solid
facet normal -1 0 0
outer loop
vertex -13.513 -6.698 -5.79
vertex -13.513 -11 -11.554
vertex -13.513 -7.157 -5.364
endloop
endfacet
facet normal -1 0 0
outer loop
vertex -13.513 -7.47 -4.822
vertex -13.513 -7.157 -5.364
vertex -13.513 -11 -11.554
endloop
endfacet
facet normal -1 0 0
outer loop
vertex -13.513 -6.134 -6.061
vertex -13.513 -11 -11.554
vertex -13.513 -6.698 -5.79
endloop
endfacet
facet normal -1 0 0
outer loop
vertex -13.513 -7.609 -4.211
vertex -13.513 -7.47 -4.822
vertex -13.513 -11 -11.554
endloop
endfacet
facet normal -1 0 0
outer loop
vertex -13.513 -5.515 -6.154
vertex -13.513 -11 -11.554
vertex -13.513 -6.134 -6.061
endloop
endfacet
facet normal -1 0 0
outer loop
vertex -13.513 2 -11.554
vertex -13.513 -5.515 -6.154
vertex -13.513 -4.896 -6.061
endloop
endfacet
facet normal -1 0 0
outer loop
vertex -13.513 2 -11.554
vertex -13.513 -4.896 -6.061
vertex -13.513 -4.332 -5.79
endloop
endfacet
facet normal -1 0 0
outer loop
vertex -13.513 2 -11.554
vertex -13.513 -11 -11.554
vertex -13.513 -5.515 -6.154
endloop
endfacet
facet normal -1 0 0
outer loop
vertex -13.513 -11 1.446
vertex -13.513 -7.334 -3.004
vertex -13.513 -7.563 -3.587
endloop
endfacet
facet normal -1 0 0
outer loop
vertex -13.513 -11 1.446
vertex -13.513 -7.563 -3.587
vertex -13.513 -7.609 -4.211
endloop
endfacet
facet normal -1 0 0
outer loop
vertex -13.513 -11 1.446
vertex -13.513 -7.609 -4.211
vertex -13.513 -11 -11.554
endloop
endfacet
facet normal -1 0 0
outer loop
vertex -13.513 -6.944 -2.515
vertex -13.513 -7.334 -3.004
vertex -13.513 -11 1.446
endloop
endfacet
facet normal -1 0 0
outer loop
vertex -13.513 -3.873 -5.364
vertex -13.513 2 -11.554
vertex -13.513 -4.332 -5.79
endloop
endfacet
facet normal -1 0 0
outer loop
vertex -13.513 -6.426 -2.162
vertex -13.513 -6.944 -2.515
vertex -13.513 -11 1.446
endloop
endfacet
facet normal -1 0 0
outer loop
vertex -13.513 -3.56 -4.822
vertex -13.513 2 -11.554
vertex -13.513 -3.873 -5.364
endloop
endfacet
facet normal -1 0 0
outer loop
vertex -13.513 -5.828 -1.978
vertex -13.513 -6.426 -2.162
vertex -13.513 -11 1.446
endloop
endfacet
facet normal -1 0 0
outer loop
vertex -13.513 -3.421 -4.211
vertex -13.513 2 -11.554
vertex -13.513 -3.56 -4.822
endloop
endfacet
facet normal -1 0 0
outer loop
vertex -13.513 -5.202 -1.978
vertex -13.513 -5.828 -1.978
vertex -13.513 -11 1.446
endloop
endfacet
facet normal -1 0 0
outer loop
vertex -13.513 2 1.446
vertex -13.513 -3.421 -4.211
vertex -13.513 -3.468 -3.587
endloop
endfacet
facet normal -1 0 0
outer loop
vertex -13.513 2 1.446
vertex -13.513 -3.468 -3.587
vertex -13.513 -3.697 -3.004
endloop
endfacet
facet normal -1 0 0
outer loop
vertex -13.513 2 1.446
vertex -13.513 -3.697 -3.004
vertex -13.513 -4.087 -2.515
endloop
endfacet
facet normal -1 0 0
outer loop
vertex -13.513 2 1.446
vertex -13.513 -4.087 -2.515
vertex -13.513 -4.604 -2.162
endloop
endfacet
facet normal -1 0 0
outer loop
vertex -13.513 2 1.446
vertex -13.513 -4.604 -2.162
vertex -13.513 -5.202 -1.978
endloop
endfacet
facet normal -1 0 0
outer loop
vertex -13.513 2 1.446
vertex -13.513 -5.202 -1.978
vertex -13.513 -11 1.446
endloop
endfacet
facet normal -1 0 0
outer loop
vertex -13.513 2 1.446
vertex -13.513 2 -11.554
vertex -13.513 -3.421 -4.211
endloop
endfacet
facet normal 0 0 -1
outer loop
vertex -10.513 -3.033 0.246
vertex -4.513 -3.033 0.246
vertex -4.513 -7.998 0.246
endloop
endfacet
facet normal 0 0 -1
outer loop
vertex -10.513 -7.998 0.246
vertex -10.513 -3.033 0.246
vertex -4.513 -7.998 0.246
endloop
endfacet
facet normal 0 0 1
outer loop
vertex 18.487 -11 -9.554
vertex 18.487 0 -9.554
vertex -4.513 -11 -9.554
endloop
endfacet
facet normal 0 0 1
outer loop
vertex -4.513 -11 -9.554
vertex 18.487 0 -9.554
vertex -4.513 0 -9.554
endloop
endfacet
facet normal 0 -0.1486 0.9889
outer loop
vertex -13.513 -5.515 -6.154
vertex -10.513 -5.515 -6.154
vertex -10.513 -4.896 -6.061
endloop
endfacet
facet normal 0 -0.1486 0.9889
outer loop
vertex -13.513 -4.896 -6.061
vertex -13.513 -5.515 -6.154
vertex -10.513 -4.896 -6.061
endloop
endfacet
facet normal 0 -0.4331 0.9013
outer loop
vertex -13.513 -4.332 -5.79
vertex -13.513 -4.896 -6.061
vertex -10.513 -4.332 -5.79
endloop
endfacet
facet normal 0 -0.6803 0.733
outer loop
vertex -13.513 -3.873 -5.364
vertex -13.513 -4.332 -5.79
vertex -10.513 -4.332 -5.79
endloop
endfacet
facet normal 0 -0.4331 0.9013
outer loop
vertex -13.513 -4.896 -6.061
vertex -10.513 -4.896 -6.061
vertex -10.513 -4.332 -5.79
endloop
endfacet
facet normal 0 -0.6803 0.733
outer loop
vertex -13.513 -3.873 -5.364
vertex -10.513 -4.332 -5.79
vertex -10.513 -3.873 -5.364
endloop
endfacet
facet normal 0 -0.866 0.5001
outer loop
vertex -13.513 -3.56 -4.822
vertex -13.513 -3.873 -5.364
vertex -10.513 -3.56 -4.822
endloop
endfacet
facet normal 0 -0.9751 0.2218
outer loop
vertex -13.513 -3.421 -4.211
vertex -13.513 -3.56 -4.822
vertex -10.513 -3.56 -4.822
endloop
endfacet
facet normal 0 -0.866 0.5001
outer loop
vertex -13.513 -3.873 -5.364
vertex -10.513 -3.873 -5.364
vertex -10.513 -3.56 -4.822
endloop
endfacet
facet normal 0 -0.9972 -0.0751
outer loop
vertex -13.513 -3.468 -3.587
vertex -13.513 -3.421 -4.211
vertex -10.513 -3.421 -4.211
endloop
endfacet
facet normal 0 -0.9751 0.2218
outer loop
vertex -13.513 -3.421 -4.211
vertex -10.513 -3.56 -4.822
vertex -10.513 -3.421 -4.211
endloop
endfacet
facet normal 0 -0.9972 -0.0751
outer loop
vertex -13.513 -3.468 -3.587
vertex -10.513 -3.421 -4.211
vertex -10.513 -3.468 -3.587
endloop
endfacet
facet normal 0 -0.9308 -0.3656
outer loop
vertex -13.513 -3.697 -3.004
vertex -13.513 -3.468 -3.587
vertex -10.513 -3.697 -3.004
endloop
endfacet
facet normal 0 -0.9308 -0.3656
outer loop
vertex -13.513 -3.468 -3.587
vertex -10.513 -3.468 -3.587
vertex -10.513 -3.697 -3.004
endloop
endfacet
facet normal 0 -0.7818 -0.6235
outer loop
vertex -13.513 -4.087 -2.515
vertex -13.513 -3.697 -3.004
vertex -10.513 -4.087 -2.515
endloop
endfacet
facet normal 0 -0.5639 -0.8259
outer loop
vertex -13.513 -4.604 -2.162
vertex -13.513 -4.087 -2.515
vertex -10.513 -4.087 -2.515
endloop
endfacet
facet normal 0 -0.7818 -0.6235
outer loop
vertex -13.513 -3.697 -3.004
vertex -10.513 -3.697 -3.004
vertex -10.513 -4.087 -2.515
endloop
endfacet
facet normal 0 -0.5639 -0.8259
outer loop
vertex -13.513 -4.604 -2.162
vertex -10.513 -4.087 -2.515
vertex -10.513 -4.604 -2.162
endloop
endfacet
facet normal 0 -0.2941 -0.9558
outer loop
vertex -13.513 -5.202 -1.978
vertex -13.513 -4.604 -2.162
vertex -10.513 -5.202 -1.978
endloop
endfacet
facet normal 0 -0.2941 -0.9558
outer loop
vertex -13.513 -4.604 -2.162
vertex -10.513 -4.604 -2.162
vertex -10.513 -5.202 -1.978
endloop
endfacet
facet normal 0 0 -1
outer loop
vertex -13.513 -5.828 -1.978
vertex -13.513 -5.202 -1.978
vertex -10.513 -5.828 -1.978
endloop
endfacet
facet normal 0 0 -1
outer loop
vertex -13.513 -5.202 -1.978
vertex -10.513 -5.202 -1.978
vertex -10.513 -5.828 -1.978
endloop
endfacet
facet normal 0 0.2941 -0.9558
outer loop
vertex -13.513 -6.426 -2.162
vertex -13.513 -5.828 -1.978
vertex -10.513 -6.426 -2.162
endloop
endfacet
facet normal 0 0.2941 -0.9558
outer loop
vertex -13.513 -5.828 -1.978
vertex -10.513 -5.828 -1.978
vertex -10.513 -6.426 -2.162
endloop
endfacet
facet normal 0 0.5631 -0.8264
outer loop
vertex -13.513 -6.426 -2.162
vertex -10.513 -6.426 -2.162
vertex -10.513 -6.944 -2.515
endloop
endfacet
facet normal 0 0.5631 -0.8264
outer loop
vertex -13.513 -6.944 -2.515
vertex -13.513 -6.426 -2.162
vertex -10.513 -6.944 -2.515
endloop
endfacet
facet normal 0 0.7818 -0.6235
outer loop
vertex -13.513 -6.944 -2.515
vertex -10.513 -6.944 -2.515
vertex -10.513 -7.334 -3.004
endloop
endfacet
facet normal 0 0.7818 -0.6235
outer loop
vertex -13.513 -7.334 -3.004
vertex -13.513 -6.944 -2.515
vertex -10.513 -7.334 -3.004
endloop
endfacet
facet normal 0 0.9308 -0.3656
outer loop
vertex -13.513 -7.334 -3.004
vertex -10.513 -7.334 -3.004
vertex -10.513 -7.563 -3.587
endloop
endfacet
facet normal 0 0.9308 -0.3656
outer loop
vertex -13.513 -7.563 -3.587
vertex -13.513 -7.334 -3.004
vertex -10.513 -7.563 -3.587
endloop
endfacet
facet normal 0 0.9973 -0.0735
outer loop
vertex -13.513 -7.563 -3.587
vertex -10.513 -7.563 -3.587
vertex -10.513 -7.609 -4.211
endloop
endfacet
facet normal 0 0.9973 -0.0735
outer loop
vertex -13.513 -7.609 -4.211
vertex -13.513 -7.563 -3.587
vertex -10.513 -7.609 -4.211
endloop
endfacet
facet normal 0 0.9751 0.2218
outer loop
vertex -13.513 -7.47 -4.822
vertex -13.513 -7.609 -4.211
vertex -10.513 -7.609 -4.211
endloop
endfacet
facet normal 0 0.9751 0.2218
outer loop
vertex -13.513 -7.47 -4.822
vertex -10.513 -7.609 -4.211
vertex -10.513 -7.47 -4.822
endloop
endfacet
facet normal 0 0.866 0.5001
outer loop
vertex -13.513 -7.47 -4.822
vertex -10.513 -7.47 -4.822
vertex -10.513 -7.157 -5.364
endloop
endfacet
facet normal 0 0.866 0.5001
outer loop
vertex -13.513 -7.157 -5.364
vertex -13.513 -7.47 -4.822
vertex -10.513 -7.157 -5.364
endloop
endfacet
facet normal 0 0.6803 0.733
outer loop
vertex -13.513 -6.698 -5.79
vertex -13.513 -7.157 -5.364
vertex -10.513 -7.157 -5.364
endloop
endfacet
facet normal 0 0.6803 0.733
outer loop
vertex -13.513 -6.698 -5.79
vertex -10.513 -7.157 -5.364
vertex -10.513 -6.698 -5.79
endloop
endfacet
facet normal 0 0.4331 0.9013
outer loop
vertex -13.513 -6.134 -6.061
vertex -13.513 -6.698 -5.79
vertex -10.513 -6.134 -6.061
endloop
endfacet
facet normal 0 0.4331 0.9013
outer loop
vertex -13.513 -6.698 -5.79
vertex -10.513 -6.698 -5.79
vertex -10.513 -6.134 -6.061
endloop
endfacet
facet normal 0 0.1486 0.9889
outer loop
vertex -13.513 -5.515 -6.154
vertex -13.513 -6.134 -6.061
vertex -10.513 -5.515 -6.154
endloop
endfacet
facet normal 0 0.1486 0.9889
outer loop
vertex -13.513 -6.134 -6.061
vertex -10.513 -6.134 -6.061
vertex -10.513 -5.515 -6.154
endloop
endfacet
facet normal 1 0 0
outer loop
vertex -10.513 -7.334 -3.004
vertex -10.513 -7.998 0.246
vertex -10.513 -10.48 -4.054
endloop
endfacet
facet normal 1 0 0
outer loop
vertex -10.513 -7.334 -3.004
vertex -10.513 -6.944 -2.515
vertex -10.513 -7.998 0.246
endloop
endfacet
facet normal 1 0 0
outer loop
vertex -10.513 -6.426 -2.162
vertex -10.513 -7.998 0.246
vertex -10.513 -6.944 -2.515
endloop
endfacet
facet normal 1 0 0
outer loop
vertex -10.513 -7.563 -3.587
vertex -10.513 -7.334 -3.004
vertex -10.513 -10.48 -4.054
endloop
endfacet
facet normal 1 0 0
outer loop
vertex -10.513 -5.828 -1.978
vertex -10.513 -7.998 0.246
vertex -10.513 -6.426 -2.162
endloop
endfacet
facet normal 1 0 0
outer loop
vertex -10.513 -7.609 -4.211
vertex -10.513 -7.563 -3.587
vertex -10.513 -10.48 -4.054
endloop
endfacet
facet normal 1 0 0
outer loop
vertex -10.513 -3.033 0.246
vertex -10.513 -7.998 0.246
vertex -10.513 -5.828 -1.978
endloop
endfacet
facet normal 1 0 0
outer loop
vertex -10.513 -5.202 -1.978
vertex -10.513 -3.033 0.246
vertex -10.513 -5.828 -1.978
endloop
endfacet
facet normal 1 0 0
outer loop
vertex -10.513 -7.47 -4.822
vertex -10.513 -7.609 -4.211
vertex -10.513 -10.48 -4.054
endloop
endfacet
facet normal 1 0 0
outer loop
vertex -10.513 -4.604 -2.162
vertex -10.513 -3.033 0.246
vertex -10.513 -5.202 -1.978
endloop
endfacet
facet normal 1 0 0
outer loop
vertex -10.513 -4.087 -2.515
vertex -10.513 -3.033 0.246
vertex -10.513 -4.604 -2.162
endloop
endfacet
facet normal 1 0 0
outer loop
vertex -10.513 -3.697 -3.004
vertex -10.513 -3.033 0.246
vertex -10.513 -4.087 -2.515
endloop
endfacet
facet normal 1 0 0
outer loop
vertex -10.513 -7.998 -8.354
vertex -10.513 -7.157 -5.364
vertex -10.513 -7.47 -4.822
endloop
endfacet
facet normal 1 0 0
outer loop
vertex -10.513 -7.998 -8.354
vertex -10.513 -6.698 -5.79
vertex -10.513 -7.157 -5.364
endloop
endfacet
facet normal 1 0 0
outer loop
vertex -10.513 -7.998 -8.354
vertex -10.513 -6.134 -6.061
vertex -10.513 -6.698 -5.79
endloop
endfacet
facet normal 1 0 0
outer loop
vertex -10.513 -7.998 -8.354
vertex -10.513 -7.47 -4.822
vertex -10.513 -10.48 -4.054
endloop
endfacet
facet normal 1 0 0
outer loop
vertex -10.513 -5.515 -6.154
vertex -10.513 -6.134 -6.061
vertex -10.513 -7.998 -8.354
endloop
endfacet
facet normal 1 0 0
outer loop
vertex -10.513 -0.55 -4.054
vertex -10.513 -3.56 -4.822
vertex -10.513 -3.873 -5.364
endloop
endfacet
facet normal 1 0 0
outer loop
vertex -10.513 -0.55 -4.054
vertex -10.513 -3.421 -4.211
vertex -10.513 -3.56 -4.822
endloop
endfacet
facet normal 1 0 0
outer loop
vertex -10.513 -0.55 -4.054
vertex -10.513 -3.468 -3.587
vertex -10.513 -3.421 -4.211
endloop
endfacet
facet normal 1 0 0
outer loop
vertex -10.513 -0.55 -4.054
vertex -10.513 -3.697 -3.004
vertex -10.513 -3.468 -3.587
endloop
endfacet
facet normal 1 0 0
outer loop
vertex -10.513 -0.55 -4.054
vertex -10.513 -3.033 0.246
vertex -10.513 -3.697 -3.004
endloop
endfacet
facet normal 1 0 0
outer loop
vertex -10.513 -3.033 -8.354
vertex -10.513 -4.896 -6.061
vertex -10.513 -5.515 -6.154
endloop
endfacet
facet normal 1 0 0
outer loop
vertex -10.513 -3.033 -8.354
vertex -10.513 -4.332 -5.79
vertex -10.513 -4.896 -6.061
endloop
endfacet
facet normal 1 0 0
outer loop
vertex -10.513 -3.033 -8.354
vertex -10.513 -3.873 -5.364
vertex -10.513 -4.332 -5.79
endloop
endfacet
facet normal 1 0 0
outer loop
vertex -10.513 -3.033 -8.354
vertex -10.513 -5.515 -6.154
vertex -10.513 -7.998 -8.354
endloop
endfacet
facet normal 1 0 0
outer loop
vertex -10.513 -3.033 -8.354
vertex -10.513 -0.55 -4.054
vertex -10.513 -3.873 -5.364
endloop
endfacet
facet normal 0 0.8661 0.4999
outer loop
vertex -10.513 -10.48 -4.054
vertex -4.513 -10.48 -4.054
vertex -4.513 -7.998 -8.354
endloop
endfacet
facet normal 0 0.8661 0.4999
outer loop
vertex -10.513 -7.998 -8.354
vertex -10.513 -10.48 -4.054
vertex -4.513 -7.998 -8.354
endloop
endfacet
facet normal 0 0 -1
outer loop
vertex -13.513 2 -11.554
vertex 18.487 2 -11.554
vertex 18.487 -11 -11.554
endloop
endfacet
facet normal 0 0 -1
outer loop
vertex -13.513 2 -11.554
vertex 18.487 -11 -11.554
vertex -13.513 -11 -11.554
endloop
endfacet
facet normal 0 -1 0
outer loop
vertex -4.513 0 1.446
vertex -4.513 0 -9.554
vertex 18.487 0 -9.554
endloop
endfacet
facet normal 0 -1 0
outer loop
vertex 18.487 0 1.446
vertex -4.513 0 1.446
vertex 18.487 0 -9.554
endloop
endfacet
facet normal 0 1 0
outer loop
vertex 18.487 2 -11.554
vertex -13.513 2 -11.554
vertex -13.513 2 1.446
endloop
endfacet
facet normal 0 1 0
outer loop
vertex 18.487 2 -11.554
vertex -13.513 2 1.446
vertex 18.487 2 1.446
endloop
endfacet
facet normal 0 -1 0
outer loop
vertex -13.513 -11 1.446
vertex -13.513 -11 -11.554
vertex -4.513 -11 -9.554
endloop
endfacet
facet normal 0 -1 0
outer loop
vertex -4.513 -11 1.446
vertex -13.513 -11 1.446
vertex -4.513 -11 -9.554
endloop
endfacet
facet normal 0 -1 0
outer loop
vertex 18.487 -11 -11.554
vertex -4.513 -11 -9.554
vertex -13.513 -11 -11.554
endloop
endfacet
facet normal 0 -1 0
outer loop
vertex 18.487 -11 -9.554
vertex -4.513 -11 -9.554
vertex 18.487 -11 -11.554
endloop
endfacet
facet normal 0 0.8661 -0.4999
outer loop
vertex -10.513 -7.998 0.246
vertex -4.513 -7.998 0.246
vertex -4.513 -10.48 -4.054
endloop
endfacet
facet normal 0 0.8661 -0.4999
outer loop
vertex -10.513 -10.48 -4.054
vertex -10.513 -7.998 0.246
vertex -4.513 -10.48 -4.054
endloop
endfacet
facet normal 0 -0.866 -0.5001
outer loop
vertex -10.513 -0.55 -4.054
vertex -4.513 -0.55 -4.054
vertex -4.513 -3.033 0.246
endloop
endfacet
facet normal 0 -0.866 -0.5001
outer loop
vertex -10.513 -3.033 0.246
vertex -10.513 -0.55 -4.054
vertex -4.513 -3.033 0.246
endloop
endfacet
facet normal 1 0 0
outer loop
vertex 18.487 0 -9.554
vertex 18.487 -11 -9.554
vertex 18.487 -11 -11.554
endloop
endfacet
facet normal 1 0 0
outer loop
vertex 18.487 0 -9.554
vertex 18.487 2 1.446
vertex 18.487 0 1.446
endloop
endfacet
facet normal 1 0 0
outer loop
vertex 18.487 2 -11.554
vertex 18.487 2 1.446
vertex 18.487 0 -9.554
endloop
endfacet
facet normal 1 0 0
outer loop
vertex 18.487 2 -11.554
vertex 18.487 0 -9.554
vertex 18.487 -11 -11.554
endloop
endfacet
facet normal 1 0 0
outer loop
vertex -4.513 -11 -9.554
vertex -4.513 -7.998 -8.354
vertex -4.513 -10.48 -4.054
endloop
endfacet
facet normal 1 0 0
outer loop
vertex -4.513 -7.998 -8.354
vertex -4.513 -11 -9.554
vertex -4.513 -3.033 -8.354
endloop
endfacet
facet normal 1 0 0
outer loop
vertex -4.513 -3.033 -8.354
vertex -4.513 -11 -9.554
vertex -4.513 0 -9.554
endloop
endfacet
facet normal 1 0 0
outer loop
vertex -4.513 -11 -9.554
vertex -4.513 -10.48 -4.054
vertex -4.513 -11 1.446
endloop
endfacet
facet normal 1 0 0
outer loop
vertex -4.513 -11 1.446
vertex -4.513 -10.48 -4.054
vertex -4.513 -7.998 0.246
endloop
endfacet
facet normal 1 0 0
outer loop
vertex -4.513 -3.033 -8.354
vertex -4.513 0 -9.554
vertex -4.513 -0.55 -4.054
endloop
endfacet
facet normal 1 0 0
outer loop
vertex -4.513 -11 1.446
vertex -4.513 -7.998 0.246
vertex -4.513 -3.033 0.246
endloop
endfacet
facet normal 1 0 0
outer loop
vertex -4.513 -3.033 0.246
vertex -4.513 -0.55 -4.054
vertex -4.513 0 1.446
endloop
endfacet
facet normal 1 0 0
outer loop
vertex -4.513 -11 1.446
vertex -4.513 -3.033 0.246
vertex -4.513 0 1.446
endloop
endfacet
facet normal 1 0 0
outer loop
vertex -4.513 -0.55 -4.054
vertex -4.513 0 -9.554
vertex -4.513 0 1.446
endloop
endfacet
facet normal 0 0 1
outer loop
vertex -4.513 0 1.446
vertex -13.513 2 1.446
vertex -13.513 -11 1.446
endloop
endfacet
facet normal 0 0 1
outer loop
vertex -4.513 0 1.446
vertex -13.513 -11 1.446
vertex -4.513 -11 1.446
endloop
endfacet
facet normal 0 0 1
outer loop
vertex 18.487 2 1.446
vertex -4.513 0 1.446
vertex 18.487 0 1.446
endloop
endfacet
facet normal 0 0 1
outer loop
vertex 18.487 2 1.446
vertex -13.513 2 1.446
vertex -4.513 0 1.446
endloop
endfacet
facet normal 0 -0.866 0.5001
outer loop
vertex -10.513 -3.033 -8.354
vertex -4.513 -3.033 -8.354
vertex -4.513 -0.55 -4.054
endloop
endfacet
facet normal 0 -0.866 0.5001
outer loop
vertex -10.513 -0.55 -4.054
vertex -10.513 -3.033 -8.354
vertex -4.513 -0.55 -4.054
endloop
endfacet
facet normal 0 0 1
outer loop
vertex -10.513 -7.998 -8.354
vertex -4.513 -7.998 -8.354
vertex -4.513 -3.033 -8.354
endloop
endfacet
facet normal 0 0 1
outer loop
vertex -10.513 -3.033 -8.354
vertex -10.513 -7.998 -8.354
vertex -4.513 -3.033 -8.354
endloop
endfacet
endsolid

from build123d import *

# Parameters (mm, degrees)
SKETCH_1_W          = 32
SKETCH_1_H          = 13
EXTRUDE_1_DEPTH     = 2
SKETCH_2_W          = 32
SKETCH_2_H          = 2
EXTRUDE_2_DEPTH     = 11
SKETCH_3_W          = 9
SKETCH_3_H          = 11
EXTRUDE_3_DEPTH     = 11
CUT_EXTRUDE_1_DEPTH = 6
SKETCH_5_R          = 2.1
CUT_EXTRUDE_2_DEPTH = 3


with BuildPart() as part:
    # 草图1 → 凸台-拉伸1 (new body)
    with BuildSketch(Plane(origin=(0, 0, 0), x_dir=(1, 0, 0), z_dir=(0, 1, 0))):
        with Locations((2.487093154, 5.054433221)):
            Rectangle(SKETCH_1_W, SKETCH_1_H)
    extrude(amount=EXTRUDE_1_DEPTH)

    # 草图2 → 凸台-拉伸2 (add)
    with BuildSketch(Plane(origin=(0, 0, 0), x_dir=(-1, 0, 0), z_dir=(0, -1, 0))):
        with Locations((-2.487093154, 10.554433221)):
            Rectangle(SKETCH_2_W, SKETCH_2_H)
    extrude(amount=EXTRUDE_2_DEPTH)

    # 草图3 → 凸台-拉伸3 (add)
    with BuildSketch(Plane.XZ):
        with Locations((-9.012906846, -4.054433221)):
            Rectangle(SKETCH_3_W, SKETCH_3_H)
    extrude(amount=EXTRUDE_3_DEPTH)

    # 草图4 → 切除-拉伸1 (cut)
    with BuildSketch(Plane(origin=(-4.512906846, 0, 0), x_dir=(0, 0, -1), z_dir=(1, 0, 0))):
        Polygon((4.054433221, -10.48042463), (8.354433221, -7.997818473), (8.354433221, -3.032606158), (4.054433221, -0.55), (-0.245566779, -3.032606158), (-0.245566779, -7.997818473), align=None)
    extrude(amount=-CUT_EXTRUDE_1_DEPTH, mode=Mode.SUBTRACT)

    # 草图5 → 切除-拉伸2 (cut)
    with BuildSketch(Plane(origin=(-10.512906846, 0, 0), x_dir=(0, 0, -1), z_dir=(1, 0, 0))):
        with Locations((4.054433221, -5.515212315)):
            Circle(SKETCH_5_R)
    extrude(amount=-CUT_EXTRUDE_2_DEPTH, mode=Mode.SUBTRACT)


solid = part.part
